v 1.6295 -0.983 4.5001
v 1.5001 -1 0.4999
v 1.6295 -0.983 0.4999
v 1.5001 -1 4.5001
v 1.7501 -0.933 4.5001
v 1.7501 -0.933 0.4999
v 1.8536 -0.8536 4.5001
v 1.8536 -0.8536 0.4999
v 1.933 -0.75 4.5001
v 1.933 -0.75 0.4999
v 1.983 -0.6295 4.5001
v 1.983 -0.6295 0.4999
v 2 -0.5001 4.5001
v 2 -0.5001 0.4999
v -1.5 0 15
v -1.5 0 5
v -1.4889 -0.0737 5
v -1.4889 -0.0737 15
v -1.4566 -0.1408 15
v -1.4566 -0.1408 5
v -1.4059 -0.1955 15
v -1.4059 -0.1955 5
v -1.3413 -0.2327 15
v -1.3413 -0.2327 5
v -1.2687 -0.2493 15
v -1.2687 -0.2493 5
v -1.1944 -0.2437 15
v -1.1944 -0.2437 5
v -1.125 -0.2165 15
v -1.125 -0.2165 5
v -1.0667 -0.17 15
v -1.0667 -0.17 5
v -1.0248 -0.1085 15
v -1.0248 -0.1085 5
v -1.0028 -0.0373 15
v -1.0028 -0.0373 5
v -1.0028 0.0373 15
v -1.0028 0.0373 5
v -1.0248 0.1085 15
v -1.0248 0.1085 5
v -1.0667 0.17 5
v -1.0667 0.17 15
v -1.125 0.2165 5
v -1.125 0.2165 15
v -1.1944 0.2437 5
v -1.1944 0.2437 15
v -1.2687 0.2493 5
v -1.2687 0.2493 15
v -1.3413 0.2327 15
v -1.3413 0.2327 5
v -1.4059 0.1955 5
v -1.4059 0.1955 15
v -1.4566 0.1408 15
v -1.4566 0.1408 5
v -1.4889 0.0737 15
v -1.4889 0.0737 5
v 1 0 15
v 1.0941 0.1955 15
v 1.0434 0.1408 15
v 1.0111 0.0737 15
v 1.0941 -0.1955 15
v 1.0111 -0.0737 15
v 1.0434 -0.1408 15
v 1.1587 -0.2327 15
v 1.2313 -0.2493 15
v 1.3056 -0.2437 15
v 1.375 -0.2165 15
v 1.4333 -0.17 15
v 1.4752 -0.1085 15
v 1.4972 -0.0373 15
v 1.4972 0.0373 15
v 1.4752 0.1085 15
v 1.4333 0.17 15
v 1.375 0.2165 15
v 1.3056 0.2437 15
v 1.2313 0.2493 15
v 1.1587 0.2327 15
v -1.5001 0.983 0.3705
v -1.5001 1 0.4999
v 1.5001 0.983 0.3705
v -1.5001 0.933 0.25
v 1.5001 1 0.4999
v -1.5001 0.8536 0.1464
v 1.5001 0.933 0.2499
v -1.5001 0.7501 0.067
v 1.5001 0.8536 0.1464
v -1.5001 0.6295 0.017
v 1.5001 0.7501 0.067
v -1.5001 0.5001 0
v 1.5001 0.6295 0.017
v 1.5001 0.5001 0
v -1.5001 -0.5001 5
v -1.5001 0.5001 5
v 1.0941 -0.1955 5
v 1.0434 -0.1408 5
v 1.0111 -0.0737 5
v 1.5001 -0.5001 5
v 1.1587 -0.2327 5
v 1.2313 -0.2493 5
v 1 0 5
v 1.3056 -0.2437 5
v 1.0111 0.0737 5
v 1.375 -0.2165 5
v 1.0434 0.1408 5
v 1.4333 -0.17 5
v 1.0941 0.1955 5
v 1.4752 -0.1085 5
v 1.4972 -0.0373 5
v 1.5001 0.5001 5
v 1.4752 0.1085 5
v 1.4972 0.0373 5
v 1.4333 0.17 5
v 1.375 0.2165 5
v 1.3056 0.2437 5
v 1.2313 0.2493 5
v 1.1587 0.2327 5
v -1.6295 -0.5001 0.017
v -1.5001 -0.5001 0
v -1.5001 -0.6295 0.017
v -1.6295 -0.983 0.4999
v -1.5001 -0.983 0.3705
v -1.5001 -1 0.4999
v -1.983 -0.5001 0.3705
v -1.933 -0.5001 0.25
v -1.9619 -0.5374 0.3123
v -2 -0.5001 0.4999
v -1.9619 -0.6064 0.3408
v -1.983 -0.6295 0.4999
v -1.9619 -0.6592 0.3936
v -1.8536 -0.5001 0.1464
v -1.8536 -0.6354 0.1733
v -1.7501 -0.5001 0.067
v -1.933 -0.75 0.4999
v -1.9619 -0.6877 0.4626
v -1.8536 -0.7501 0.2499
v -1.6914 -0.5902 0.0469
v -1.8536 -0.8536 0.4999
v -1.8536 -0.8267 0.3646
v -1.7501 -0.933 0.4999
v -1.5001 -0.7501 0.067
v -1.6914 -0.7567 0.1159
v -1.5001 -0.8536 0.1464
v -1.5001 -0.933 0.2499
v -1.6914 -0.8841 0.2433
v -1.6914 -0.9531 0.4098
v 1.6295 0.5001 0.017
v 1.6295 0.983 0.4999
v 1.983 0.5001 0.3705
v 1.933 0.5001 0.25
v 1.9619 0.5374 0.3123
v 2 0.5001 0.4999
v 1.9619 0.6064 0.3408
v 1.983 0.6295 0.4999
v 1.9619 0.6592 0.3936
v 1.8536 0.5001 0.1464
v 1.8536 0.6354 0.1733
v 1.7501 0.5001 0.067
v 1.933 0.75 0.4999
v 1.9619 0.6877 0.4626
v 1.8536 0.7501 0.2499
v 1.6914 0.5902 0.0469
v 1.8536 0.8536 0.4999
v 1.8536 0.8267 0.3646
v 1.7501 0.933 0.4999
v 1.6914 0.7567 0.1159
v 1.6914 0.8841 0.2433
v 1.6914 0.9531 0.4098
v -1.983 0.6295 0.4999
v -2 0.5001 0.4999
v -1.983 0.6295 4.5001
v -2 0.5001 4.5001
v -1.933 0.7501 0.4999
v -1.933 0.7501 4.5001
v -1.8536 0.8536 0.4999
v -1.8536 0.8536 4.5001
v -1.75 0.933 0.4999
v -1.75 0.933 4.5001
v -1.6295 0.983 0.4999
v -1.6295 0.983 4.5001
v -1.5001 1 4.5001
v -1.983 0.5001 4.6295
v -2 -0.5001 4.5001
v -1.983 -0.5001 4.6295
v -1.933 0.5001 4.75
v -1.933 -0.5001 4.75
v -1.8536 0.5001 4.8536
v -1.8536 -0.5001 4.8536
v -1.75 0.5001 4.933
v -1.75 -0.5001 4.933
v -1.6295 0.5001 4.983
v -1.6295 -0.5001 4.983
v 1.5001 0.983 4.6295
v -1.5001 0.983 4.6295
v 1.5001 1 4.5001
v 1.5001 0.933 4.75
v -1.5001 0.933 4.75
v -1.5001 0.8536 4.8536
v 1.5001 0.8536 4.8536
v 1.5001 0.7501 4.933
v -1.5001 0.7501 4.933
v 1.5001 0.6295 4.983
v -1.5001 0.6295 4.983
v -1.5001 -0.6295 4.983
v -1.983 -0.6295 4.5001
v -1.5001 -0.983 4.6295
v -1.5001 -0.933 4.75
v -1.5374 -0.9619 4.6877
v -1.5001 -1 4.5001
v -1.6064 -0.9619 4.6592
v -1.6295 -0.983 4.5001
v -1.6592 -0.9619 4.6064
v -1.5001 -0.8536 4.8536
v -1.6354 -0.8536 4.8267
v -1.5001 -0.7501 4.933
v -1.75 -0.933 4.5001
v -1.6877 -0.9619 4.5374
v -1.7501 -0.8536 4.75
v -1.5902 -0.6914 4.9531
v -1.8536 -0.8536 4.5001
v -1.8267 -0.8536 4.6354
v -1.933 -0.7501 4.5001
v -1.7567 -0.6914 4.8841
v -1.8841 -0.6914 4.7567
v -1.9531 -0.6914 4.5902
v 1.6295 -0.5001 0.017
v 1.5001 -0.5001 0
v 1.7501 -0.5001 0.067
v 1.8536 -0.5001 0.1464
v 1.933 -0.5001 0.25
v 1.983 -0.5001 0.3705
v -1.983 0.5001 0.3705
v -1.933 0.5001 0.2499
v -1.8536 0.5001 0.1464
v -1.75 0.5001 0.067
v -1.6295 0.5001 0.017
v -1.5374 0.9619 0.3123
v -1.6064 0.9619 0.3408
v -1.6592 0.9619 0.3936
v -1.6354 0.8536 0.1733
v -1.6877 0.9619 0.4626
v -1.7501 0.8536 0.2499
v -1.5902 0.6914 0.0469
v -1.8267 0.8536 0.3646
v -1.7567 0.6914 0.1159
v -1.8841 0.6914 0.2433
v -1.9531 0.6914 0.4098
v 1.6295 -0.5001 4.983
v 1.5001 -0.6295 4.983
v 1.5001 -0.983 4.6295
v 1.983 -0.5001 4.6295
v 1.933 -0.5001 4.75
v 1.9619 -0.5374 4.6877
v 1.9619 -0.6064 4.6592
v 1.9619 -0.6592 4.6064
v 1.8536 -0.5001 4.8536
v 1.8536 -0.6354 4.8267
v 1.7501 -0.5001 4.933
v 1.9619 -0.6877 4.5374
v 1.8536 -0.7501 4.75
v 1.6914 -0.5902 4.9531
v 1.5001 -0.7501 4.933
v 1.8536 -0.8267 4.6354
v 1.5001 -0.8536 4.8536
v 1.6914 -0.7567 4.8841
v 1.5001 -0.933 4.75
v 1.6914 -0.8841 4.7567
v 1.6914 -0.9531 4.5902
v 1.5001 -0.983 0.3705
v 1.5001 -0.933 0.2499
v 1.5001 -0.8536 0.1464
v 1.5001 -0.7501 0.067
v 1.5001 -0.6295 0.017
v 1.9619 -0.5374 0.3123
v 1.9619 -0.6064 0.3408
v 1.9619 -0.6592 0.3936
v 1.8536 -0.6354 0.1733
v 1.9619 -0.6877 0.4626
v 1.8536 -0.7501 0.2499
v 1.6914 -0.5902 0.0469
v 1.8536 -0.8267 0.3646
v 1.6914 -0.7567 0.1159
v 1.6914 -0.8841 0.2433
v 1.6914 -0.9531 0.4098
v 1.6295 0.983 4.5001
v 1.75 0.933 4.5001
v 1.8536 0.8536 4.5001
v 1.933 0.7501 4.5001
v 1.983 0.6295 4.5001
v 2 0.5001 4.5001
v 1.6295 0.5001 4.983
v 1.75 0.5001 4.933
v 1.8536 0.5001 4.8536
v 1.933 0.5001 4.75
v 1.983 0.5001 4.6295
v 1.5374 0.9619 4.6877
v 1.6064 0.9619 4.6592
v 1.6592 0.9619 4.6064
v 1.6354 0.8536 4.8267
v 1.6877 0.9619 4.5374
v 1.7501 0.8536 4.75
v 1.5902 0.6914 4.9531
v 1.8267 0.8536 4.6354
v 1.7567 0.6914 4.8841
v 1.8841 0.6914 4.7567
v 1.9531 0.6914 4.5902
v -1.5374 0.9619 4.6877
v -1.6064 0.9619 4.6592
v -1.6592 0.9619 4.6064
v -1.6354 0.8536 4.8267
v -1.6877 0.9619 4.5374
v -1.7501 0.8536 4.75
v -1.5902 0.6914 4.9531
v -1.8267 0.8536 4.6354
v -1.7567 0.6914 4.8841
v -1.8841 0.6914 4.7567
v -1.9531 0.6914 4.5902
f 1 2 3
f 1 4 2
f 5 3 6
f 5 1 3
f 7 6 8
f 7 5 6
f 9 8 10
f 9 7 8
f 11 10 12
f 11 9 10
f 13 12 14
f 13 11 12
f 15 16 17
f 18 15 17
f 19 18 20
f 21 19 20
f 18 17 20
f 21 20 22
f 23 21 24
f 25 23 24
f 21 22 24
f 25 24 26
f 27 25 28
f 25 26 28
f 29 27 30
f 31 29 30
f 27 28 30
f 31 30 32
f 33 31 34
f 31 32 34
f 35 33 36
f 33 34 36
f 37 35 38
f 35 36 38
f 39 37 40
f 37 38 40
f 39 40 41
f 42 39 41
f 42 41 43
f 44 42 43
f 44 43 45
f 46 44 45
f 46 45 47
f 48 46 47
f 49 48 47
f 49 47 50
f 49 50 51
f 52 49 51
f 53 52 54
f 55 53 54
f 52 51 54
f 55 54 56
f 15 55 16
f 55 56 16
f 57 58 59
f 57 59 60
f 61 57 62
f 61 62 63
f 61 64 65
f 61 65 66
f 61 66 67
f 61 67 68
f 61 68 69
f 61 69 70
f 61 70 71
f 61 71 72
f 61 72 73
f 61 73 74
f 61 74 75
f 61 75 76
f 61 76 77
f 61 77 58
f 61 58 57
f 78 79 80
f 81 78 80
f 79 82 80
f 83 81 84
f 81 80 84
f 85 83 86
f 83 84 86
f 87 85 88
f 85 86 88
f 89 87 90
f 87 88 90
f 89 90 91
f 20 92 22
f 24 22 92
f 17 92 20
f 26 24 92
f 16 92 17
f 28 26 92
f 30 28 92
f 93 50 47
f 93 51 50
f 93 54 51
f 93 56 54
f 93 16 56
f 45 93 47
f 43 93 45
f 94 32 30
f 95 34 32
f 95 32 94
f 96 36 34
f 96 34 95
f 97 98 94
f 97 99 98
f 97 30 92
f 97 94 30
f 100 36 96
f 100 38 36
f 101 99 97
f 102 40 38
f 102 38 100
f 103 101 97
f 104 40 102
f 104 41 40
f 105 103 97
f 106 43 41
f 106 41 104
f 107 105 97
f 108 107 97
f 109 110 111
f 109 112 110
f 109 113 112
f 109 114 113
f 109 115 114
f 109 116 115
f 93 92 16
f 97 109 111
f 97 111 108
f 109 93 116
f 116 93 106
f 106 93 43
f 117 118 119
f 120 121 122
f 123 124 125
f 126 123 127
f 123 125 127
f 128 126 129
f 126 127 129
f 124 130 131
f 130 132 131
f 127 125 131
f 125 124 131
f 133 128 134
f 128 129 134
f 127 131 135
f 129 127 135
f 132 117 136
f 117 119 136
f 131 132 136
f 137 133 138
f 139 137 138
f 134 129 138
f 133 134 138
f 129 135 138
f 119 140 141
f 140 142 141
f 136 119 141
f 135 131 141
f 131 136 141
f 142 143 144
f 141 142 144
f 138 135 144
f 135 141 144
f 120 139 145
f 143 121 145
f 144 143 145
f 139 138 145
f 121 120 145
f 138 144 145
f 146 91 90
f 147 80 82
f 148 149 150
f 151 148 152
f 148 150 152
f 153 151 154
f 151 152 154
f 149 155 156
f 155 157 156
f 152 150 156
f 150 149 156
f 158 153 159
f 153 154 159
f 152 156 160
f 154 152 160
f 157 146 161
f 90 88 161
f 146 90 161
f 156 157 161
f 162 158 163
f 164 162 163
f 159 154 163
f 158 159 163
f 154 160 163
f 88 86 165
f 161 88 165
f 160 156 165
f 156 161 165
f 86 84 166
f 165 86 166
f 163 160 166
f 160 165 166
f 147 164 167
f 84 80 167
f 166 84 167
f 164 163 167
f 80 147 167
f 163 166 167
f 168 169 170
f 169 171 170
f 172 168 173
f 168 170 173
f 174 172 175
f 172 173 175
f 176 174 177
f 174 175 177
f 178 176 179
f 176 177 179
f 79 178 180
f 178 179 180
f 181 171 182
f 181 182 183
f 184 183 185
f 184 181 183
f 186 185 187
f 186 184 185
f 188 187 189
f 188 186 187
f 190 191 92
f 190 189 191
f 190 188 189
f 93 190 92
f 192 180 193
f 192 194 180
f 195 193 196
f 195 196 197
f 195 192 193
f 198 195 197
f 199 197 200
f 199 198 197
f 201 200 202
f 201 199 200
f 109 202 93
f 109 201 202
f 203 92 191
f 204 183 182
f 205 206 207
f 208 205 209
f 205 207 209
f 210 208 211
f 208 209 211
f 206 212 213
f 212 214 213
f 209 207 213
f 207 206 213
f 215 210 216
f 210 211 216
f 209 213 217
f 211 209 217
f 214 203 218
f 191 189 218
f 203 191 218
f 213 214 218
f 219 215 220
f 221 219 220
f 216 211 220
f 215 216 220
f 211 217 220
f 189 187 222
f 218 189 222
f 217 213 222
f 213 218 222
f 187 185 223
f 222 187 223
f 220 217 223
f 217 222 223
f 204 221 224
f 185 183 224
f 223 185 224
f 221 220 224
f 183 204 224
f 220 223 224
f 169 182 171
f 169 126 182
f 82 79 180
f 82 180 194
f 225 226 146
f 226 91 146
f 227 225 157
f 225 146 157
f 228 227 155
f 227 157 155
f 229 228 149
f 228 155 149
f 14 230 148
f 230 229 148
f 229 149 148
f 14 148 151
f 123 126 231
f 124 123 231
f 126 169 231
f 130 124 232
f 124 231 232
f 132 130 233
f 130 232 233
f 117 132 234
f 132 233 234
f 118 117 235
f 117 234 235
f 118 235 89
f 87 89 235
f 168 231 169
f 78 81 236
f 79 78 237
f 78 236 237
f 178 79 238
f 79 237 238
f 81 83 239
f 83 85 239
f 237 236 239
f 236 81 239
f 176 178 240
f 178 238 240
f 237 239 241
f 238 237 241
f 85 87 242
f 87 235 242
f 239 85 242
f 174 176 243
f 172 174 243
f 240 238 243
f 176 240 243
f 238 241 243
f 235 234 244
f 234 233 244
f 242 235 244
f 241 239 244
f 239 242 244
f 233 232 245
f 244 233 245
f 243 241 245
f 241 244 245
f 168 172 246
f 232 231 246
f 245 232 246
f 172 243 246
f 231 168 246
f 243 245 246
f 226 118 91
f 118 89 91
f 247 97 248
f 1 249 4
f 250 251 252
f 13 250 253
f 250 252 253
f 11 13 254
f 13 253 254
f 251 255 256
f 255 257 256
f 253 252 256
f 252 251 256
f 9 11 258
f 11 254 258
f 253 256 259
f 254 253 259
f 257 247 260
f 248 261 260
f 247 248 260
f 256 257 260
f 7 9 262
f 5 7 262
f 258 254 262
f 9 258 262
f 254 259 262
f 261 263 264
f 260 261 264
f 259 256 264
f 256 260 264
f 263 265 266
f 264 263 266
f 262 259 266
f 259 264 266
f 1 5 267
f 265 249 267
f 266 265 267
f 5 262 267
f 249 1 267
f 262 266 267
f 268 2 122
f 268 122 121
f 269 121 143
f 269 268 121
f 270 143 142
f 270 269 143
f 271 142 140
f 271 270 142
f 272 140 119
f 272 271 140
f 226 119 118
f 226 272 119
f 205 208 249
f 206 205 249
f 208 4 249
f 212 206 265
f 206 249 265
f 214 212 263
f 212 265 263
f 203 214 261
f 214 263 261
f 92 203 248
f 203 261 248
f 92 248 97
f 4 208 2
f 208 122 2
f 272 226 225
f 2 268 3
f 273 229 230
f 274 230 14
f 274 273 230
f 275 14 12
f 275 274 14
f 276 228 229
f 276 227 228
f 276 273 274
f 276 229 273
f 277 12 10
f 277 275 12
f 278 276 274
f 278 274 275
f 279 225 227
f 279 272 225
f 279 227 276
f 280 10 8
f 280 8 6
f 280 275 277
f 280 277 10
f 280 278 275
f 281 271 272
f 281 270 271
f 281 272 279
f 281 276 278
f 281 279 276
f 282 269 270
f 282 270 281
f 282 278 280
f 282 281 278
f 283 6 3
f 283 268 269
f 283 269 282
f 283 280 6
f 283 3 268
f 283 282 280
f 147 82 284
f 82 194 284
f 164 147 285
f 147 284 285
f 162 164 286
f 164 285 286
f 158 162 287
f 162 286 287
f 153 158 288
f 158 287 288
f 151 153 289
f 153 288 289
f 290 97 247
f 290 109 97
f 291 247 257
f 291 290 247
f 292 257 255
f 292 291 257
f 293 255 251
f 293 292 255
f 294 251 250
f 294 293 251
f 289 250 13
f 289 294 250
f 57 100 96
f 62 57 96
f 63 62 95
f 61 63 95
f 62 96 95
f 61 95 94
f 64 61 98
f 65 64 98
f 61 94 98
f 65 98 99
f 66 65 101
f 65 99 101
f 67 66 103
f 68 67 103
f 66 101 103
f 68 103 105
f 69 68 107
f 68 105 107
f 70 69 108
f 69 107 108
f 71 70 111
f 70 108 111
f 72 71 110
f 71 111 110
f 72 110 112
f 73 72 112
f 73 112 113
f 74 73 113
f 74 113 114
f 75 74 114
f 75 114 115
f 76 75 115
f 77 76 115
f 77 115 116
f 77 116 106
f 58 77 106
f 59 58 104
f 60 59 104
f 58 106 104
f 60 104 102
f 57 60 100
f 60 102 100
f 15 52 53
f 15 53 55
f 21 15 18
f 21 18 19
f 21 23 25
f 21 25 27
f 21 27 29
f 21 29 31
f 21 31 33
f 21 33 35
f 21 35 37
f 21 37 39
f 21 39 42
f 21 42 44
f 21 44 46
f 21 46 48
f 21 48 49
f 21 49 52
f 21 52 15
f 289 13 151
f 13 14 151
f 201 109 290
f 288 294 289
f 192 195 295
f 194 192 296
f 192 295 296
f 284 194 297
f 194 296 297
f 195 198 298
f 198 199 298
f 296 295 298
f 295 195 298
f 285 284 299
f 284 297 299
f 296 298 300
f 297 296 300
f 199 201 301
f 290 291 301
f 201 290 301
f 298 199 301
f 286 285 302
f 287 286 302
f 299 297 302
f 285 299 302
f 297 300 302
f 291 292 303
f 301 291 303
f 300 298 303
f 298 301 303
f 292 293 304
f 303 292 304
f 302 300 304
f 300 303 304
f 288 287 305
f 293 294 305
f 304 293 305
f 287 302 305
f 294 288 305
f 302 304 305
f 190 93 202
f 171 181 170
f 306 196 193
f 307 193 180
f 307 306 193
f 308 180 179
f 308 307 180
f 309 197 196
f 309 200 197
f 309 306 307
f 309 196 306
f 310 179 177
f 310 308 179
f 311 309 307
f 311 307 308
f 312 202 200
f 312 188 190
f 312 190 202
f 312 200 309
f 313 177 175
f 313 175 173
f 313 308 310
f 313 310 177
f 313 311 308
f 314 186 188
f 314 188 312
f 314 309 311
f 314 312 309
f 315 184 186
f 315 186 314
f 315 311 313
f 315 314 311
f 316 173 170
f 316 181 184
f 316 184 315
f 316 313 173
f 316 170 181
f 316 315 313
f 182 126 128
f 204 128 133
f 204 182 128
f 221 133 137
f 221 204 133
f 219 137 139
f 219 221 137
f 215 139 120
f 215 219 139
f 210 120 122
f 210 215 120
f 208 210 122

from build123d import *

# Parameters (mm, degrees)
SKETCH1_W           = 4
SKETCH1_H           = 2
BOSS_EXTRUDE1_DEPTH = 5
SKETCH2_R           = 0.25
BOSS_EXTRUDE2_DEPTH = 10
FILLET1_R           = 0.5


with BuildPart() as part:
    # Sketch1 → Boss-Extrude1 (new body)
    with BuildSketch(Plane.XY):
        Rectangle(SKETCH1_W, SKETCH1_H)
    extrude(amount=BOSS_EXTRUDE1_DEPTH)

    # Sketch2 → Boss-Extrude2 (add)
    with BuildSketch(Plane.XY.offset(5)):
        with Locations(Location((-1.25, 0, 0), (0, 0, 180))):
            Circle(SKETCH2_R)
        with Locations(Location((1.25, 0, 0), (0, 0, 180))):
            Circle(SKETCH2_R)
    extrude(amount=BOSS_EXTRUDE2_DEPTH)

    # Fillet1
    fillet1_edges = [part.edges().sort_by_distance(p)[0] for p in [
        (-2, 0, 5),
        (0, -1, 5),
        (2, 0, 5),
        (0, -1, 0),
        (-2, 0, 0),
        (0, 1, 0),
        (2, 0, 0),
        (0, 1, 5),
        (2, -1, 2.5),
        (-2, -1, 2.5),
        (-2, 1, 2.5),
        (2, 1, 2.5),
    ]]
    fillet(fillet1_edges, radius=FILLET1_R - 0.0001)  # a hair under: the kernel refuses the full size


solid = part.part
